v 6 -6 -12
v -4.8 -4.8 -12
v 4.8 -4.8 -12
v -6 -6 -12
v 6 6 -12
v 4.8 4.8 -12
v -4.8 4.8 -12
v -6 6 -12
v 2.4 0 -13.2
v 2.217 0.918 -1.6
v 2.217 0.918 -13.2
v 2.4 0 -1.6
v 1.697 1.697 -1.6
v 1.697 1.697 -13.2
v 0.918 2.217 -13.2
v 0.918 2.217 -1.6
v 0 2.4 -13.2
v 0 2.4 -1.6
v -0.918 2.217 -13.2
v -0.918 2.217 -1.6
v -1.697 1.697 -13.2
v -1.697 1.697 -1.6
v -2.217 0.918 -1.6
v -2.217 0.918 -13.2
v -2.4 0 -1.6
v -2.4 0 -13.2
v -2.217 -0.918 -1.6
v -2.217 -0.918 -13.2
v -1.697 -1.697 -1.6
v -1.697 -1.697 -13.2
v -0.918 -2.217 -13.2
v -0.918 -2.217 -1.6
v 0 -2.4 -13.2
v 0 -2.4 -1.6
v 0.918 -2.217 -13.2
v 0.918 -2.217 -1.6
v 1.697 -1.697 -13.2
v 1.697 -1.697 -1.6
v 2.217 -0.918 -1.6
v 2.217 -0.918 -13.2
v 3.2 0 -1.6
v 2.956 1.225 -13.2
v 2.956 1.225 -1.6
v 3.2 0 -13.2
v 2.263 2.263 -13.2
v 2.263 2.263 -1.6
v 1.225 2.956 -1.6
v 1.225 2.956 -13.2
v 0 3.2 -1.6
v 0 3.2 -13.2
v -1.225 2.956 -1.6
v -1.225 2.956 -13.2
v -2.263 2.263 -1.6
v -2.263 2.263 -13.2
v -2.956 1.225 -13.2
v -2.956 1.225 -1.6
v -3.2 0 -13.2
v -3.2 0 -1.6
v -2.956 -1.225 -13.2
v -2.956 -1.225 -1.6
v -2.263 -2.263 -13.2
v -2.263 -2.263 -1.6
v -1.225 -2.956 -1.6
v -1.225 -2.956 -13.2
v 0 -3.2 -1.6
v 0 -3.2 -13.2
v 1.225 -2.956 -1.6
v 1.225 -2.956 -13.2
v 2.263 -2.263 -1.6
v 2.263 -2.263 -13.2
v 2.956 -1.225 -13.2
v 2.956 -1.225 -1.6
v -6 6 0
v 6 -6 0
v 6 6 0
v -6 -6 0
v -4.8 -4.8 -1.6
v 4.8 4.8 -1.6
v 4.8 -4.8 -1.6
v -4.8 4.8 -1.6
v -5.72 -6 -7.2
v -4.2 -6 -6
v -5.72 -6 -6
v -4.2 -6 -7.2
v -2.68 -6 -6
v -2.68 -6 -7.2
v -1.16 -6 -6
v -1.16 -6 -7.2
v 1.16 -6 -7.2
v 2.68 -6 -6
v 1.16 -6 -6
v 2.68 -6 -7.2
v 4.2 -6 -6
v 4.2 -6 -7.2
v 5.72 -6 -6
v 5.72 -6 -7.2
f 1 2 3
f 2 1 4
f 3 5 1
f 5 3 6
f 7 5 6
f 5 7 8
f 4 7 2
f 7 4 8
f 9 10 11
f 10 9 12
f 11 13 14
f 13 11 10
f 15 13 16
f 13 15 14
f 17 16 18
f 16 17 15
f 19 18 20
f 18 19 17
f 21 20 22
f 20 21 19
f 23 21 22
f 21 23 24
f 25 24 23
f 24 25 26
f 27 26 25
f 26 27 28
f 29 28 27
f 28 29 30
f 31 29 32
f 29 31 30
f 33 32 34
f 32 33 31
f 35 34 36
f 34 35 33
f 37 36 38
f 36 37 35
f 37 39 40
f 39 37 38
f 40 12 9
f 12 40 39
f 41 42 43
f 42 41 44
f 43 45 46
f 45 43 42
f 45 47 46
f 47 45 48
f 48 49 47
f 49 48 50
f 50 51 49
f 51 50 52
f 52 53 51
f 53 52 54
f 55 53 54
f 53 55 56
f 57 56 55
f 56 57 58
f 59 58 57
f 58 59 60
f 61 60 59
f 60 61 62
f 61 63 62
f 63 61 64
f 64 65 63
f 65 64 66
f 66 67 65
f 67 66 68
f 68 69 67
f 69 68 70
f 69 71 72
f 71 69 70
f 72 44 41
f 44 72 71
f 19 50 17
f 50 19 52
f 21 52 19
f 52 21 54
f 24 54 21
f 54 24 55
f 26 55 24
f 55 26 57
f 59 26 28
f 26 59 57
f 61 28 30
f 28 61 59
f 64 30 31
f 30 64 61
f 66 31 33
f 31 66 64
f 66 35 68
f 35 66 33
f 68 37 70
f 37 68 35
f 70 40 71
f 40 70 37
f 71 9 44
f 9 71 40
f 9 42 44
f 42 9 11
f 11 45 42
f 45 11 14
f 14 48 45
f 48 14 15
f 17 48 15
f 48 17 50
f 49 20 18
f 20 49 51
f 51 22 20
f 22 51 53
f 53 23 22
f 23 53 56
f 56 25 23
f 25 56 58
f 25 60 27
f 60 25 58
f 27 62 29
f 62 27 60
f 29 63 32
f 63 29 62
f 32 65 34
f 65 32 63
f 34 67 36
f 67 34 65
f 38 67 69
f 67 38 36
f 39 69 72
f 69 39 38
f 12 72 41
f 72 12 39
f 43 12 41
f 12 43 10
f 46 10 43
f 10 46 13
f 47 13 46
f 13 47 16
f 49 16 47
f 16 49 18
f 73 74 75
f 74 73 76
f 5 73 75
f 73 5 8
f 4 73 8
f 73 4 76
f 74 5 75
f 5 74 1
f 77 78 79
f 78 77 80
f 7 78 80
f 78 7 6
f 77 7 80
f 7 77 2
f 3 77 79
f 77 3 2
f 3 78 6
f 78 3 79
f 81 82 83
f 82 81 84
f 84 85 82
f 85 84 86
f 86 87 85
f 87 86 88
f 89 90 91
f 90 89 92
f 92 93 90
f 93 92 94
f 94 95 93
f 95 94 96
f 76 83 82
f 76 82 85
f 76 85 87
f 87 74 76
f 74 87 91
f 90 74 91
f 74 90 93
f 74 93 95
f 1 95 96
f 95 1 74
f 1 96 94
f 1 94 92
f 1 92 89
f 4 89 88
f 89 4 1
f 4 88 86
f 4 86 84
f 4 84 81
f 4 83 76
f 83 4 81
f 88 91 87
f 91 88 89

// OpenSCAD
// file: ../p/4-4ring3.scad
use <../lib.scad>
$fa=1; $fs=0.2;
function ldraw_lib__4_4ring3(realsolid=false) = [
// 0 Ring  3 x 1.0
// 0 Name: 4-4ring3.dat
// 0 Author: James Jessiman
// 0 !LDRAW_ORG Primitive UPDATE 2009-01
// 0 !LICENSE Licensed under CC BY 2.0 and CC BY 4.0 : see CAreadme.txt
// 
// 0 BFC CERTIFY CCW
  [0,"BFC","CERTIFY"],
  [0,"BFC","CCW"],
// 
// 0 !HISTORY 1998-12-15 [PTadmin] Official Update 1998-10
// 0 !HISTORY 2002-04-05 [hafhead] Added BFC statement
// 0 !HISTORY 2002-04-25 [PTadmin] Official Update 2002-02
// 0 !HISTORY 2007-06-24 [PTadmin] Header formatted for Contributor Agreement
// 0 !HISTORY 2008-07-01 [PTadmin] Official Update 2008-01
// 0 !HISTORY 2008-08-26 [cwdee] Switch polygon winding and rename
// 0 !HISTORY 2009-05-02 [PTadmin] Official Update 2009-01
// 
// 
// 4 16 -1.5308 0 3.6956 -1.1481 0 2.7717 0 0 3 0 0 4
  [4,16,-1.5308,0,3.6956,-1.1481,0,2.7717,0,0,3,0,0,4],
// 4 16 -2.8284 0 2.8284 -2.1213 0 2.1213 -1.1481 0 2.7717 -1.5308 0 3.6956
  [4,16,-2.8284,0,2.8284,-2.1213,0,2.1213,-1.1481,0,2.7717,-1.5308,0,3.6956],
// 4 16 -3.6956 0 1.5308 -2.7717 0 1.1481 -2.1213 0 2.1213 -2.8284 0 2.8284
  [4,16,-3.6956,0,1.5308,-2.7717,0,1.1481,-2.1213,0,2.1213,-2.8284,0,2.8284],
// 4 16 -4 0 0 -3 0 0 -2.7717 0 1.1481 -3.6956 0 1.5308
  [4,16,-4,0,0,-3,0,0,-2.7717,0,1.1481,-3.6956,0,1.5308],
// 4 16 -3.6956 0 -1.5308 -2.7717 0 -1.1481 -3 0 0 -4 0 0
  [4,16,-3.6956,0,-1.5308,-2.7717,0,-1.1481,-3,0,0,-4,0,0],
// 4 16 -2.8284 0 -2.8284 -2.1213 0 -2.1213 -2.7717 0 -1.1481 -3.6956 0 -1.5308
  [4,16,-2.8284,0,-2.8284,-2.1213,0,-2.1213,-2.7717,0,-1.1481,-3.6956,0,-1.5308],
// 4 16 -1.5308 0 -3.6956 -1.1481 0 -2.7717 -2.1213 0 -2.1213 -2.8284 0 -2.8284
  [4,16,-1.5308,0,-3.6956,-1.1481,0,-2.7717,-2.1213,0,-2.1213,-2.8284,0,-2.8284],
// 4 16 0 0 -4 0 0 -3 -1.1481 0 -2.7717 -1.5308 0 -3.6956
  [4,16,0,0,-4,0,0,-3,-1.1481,0,-2.7717,-1.5308,0,-3.6956],
// 4 16 1.5308 0 -3.6956 1.1481 0 -2.7717 0 0 -3 0 0 -4
  [4,16,1.5308,0,-3.6956,1.1481,0,-2.7717,0,0,-3,0,0,-4],
// 4 16 2.8284 0 -2.8284 2.1213 0 -2.1213 1.1481 0 -2.7717 1.5308 0 -3.6956
  [4,16,2.8284,0,-2.8284,2.1213,0,-2.1213,1.1481,0,-2.7717,1.5308,0,-3.6956],
// 4 16 3.6956 0 -1.5308 2.7717 0 -1.1481 2.1213 0 -2.1213 2.8284 0 -2.8284
  [4,16,3.6956,0,-1.5308,2.7717,0,-1.1481,2.1213,0,-2.1213,2.8284,0,-2.8284],
// 4 16 4 0 0 3 0 0 2.7717 0 -1.1481 3.6956 0 -1.5308
  [4,16,4,0,0,3,0,0,2.7717,0,-1.1481,3.6956,0,-1.5308],
// 4 16 3.6956 0 1.5308 2.7717 0 1.1481 3 0 0 4 0 0
  [4,16,3.6956,0,1.5308,2.7717,0,1.1481,3,0,0,4,0,0],
// 4 16 2.8284 0 2.8284 2.1213 0 2.1213 2.7717 0 1.1481 3.6956 0 1.5308
  [4,16,2.8284,0,2.8284,2.1213,0,2.1213,2.7717,0,1.1481,3.6956,0,1.5308],
// 4 16 1.5308 0 3.6956 1.1481 0 2.7717 2.1213 0 2.1213 2.8284 0 2.8284
  [4,16,1.5308,0,3.6956,1.1481,0,2.7717,2.1213,0,2.1213,2.8284,0,2.8284],
// 4 16 0 0 4 0 0 3 1.1481 0 2.7717 1.5308 0 3.6956
  [4,16,0,0,4,0,0,3,1.1481,0,2.7717,1.5308,0,3.6956],
// 0
];
module ldraw_lib__4_4ring3(step=0, col=false, unit=2/5, alt=false, line=0.2, solid=!$preview)
    makepoly(ldraw_lib__4_4ring3(solid), step=step, col=col, unit=unit, alt=alt, line=line, solid=solid);
ldraw_lib__4_4ring3(line=0.2);
// file: ../p/4-4edge.scad
use <../lib.scad>
function ldraw_lib__4_4edge() = [
// 0 Circle 1.0
// 0 Name: 4-4edge.dat
// 0 Author: James Jessiman
// 0 !LDRAW_ORG Primitive UPDATE 2017-01
// 0 !LICENSE Licensed under CC BY 2.0 and CC BY 4.0 : see CAreadme.txt
// 
// 0 BFC CERTIFY CCW
  [0,"BFC","CERTIFY"],
  [0,"BFC","CCW"],
// 
// 0 !HISTORY 1998-12-15 [PTadmin] Official Update 1998-10
// 0 !HISTORY 2005-12-28 [PTadmin] Official Update 2005-01
// 0 !HISTORY 2007-06-24 [PTadmin] Header formatted for Contributor Agreement
// 0 !HISTORY 2008-07-01 [PTadmin] Official Update 2008-01
// 0 !HISTORY 2017-01-15 [Steffen] BFCed
// 0 !HISTORY 2017-12-30 [PTadmin] Official Update 2017-01
// 
// 
// 2 24 1 0 0 0.9239 0 0.3827
  [2,24,1,0,0,0.9239,0,0.3827],
// 2 24 0.9239 0 0.3827 0.7071 0 0.7071
  [2,24,0.9239,0,0.3827,0.7071,0,0.7071],
// 2 24 0.7071 0 0.7071 0.3827 0 0.9239
  [2,24,0.7071,0,0.7071,0.3827,0,0.9239],
// 2 24 0.3827 0 0.9239 0 0 1
  [2,24,0.3827,0,0.9239,0,0,1],
// 2 24 0 0 1 -0.3827 0 0.9239
  [2,24,0,0,1,-0.3827,0,0.9239],
// 2 24 -0.3827 0 0.9239 -0.7071 0 0.7071
  [2,24,-0.3827,0,0.9239,-0.7071,0,0.7071],
// 2 24 -0.7071 0 0.7071 -0.9239 0 0.3827
  [2,24,-0.7071,0,0.7071,-0.9239,0,0.3827],
// 2 24 -0.9239 0 0.3827 -1 0 -0
  [2,24,-0.9239,0,0.3827,-1,0,-0],
// 2 24 -1 0 -0 -0.9239 0 -0.3827
  [2,24,-1,0,-0,-0.9239,0,-0.3827],
// 2 24 -0.9239 0 -0.3827 -0.7071 0 -0.7071
  [2,24,-0.9239,0,-0.3827,-0.7071,0,-0.7071],
// 2 24 -0.7071 0 -0.7071 -0.3827 0 -0.9239
  [2,24,-0.7071,0,-0.7071,-0.3827,0,-0.9239],
// 2 24 -0.3827 0 -0.9239 0 0 -1
  [2,24,-0.3827,0,-0.9239,0,0,-1],
// 2 24 0 0 -1 0.3827 0 -0.9239
  [2,24,0,0,-1,0.3827,0,-0.9239],
// 2 24 0.3827 0 -0.9239 0.7071 0 -0.7071
  [2,24,0.3827,0,-0.9239,0.7071,0,-0.7071],
// 2 24 0.7071 0 -0.7071 0.9239 0 -0.3827
  [2,24,0.7071,0,-0.7071,0.9239,0,-0.3827],
// 2 24 0.9239 0 -0.3827 1 0 0
  [2,24,0.9239,0,-0.3827,1,0,0],
];
module ldraw_lib__4_4edge(step=0, col=false, unit=2/5, alt=false, line=0.2, solid=!$preview)
    makepoly(ldraw_lib__4_4edge(), step=step, col=col, unit=unit, alt=alt, line=line, solid=solid);
ldraw_lib__4_4edge(line=0.2);
// file: ../p/4-4cyli.scad
use <../lib.scad>
$fa=1; $fs=0.2;
function ldraw_lib__4_4cyli(realsolid=false) = [
// 0 Cylinder 1.0
// 0 Name: 4-4cyli.dat
// 0 Author: James Jessiman
// 0 !LDRAW_ORG Primitive UPDATE 2005-01
// 0 !LICENSE Licensed under CC BY 2.0 and CC BY 4.0 : see CAreadme.txt
// 
// 0 BFC CERTIFY CCW
  [0,"BFC","CERTIFY"],
  [0,"BFC","CCW"],
// 
// 0 !HISTORY 1998-12-15 [PTadmin] Official Update 1998-10
// 0 !HISTORY 2002-03-23 [sbliss] Added BFC statement; merged headers from files in distributions LDraw 0.27 and Complete.
// 0 !HISTORY 2002-04-25 [PTadmin] Official Update 2002-02
// 0 !HISTORY 2004-12-14 [guyvivan] BFC CCW
// 0 !HISTORY 2005-12-28 [PTadmin] Official Update 2005-01
// 0 !HISTORY 2007-06-24 [PTadmin] Header formatted for Contributor Agreement
// 0 !HISTORY 2008-07-01 [PTadmin] Official Update 2008-01
// 
// 
// 4 16 1 1 0 0.9239 1 0.3827 0.9239 0 0.3827 1 0 0
  [4,16,1,1,0,0.9239,1,0.3827,0.9239,0,0.3827,1,0,0],
// 5 24 1 0 0 1 1 0 0.9239 0 0.3827 0.9239 0 -0.3827
  [5,24,1,0,0,1,1,0,0.9239,0,0.3827,0.9239,0,-0.3827],
// 4 16 0.9239 1 0.3827 0.7071 1 0.7071 0.7071 0 0.7071 0.9239 0 0.3827
  [4,16,0.9239,1,0.3827,0.7071,1,0.7071,0.7071,0,0.7071,0.9239,0,0.3827],
// 5 24 0.9239 0 0.3827 0.9239 1 0.3827 0.7071 0 0.7071 1 0 0
  [5,24,0.9239,0,0.3827,0.9239,1,0.3827,0.7071,0,0.7071,1,0,0],
// 4 16 0.7071 1 0.7071 0.3827 1 0.9239 0.3827 0 0.9239 0.7071 0 0.7071
  [4,16,0.7071,1,0.7071,0.3827,1,0.9239,0.3827,0,0.9239,0.7071,0,0.7071],
// 5 24 0.7071 0 0.7071 0.7071 1 0.7071 0.3827 0 0.9239 0.9239 0 0.3827
  [5,24,0.7071,0,0.7071,0.7071,1,0.7071,0.3827,0,0.9239,0.9239,0,0.3827],
// 4 16 0.3827 1 0.9239 0 1 1 0 0 1 0.3827 0 0.9239
  [4,16,0.3827,1,0.9239,0,1,1,0,0,1,0.3827,0,0.9239],
// 5 24 0.3827 0 0.9239 0.3827 1 0.9239 0 0 1 0.7071 0 0.7071
  [5,24,0.3827,0,0.9239,0.3827,1,0.9239,0,0,1,0.7071,0,0.7071],
// 4 16 0 1 1 -0.3827 1 0.9239 -0.3827 0 0.9239 0 0 1
  [4,16,0,1,1,-0.3827,1,0.9239,-0.3827,0,0.9239,0,0,1],
// 5 24 0 0 1 0 1 1 -0.3827 0 0.9239 0.3827 0 0.9239
  [5,24,0,0,1,0,1,1,-0.3827,0,0.9239,0.3827,0,0.9239],
// 4 16 -0.3827 1 0.9239 -0.7071 1 0.7071 -0.7071 0 0.7071 -0.3827 0 0.9239
  [4,16,-0.3827,1,0.9239,-0.7071,1,0.7071,-0.7071,0,0.7071,-0.3827,0,0.9239],
// 5 24 -0.3827 0 0.9239 -0.3827 1 0.9239 -0.7071 0 0.7071 0 0 1
  [5,24,-0.3827,0,0.9239,-0.3827,1,0.9239,-0.7071,0,0.7071,0,0,1],
// 4 16 -0.7071 1 0.7071 -0.9239 1 0.3827 -0.9239 0 0.3827 -0.7071 0 0.7071
  [4,16,-0.7071,1,0.7071,-0.9239,1,0.3827,-0.9239,0,0.3827,-0.7071,0,0.7071],
// 5 24 -0.7071 0 0.7071 -0.7071 1 0.7071 -0.9239 0 0.3827 -0.3827 0 0.9239
  [5,24,-0.7071,0,0.7071,-0.7071,1,0.7071,-0.9239,0,0.3827,-0.3827,0,0.9239],
// 4 16 -0.9239 1 0.3827 -1 1 0 -1 0 0 -0.9239 0 0.3827
  [4,16,-0.9239,1,0.3827,-1,1,0,-1,0,0,-0.9239,0,0.3827],
// 5 24 -0.9239 0 0.3827 -0.9239 1 0.3827 -1 0 0 -0.7071 0 0.7071
  [5,24,-0.9239,0,0.3827,-0.9239,1,0.3827,-1,0,0,-0.7071,0,0.7071],
// 4 16 -1 1 0 -0.9239 1 -0.3827 -0.9239 0 -0.3827 -1 0 0
  [4,16,-1,1,0,-0.9239,1,-0.3827,-0.9239,0,-0.3827,-1,0,0],
// 5 24 -1 0 0 -1 1 0 -0.9239 0 -0.3827 -0.9239 0 0.3827
  [5,24,-1,0,0,-1,1,0,-0.9239,0,-0.3827,-0.9239,0,0.3827],
// 4 16 -0.9239 1 -0.3827 -0.7071 1 -0.7071 -0.7071 0 -0.7071 -0.9239 0 -0.3827
  [4,16,-0.9239,1,-0.3827,-0.7071,1,-0.7071,-0.7071,0,-0.7071,-0.9239,0,-0.3827],
// 5 24 -0.9239 0 -0.3827 -0.9239 1 -0.3827 -0.7071 0 -0.7071 -1 0 0
  [5,24,-0.9239,0,-0.3827,-0.9239,1,-0.3827,-0.7071,0,-0.7071,-1,0,0],
// 4 16 -0.7071 1 -0.7071 -0.3827 1 -0.9239 -0.3827 0 -0.9239 -0.7071 0 -0.7071
  [4,16,-0.7071,1,-0.7071,-0.3827,1,-0.9239,-0.3827,0,-0.9239,-0.7071,0,-0.7071],
// 5 24 -0.7071 0 -0.7071 -0.7071 1 -0.7071 -0.3827 0 -0.9239 -0.9239 0 -0.3827
  [5,24,-0.7071,0,-0.7071,-0.7071,1,-0.7071,-0.3827,0,-0.9239,-0.9239,0,-0.3827],
// 4 16 -0.3827 1 -0.9239 0 1 -1 0 0 -1 -0.3827 0 -0.9239
  [4,16,-0.3827,1,-0.9239,0,1,-1,0,0,-1,-0.3827,0,-0.9239],
// 5 24 -0.3827 0 -0.9239 -0.3827 1 -0.9239 0 0 -1 -0.7071 0 -0.7071
  [5,24,-0.3827,0,-0.9239,-0.3827,1,-0.9239,0,0,-1,-0.7071,0,-0.7071],
// 4 16 0 1 -1 0.3827 1 -0.9239 0.3827 0 -0.9239 0 0 -1
  [4,16,0,1,-1,0.3827,1,-0.9239,0.3827,0,-0.9239,0,0,-1],
// 5 24 0 0 -1 0 1 -1 0.3827 0 -0.9239 -0.3827 0 -0.9239
  [5,24,0,0,-1,0,1,-1,0.3827,0,-0.9239,-0.3827,0,-0.9239],
// 4 16 0.3827 1 -0.9239 0.7071 1 -0.7071 0.7071 0 -0.7071 0.3827 0 -0.9239
  [4,16,0.3827,1,-0.9239,0.7071,1,-0.7071,0.7071,0,-0.7071,0.3827,0,-0.9239],
// 5 24 0.3827 0 -0.9239 0.3827 1 -0.9239 0.7071 0 -0.7071 0 0 -1
  [5,24,0.3827,0,-0.9239,0.3827,1,-0.9239,0.7071,0,-0.7071,0,0,-1],
// 4 16 0.7071 1 -0.7071 0.9239 1 -0.3827 0.9239 0 -0.3827 0.7071 0 -0.7071
  [4,16,0.7071,1,-0.7071,0.9239,1,-0.3827,0.9239,0,-0.3827,0.7071,0,-0.7071],
// 5 24 0.7071 0 -0.7071 0.7071 1 -0.7071 0.9239 0 -0.3827 0.3827 0 -0.9239
  [5,24,0.7071,0,-0.7071,0.7071,1,-0.7071,0.9239,0,-0.3827,0.3827,0,-0.9239],
// 4 16 0.9239 1 -0.3827 1 1 0 1 0 0 0.9239 0 -0.3827
  [4,16,0.9239,1,-0.3827,1,1,0,1,0,0,0.9239,0,-0.3827],
// 5 24 0.9239 0 -0.3827 0.9239 1 -0.3827 1 0 0 0.7071 0 -0.7071
  [5,24,0.9239,0,-0.3827,0.9239,1,-0.3827,1,0,0,0.7071,0,-0.7071],
// 0
];
module ldraw_lib__4_4cyli(step=0, col=false, unit=2/5, alt=false, line=0.2, solid=!$preview)
    makepoly(ldraw_lib__4_4cyli(solid), step=step, col=col, unit=unit, alt=alt, line=line, solid=solid);
ldraw_lib__4_4cyli(line=0.2);
// file: ../p/stud4.scad
use <../lib.scad>
use <4-4cyli.scad>
use <4-4edge.scad>
use <4-4ring3.scad>
function ldraw_lib__stud4() = [
// 0 Stud Tube Open
// 0 Name: stud4.dat
// 0 Author: James Jessiman
// 0 !LDRAW_ORG Primitive UPDATE 2009-02
// 0 !LICENSE Licensed under CC BY 4.0 : see CAreadme.txt
// 
// 0 BFC CERTIFY CCW
  [0,"BFC","CERTIFY"],
  [0,"BFC","CCW"],
// 
// 0 !HISTORY 1999-07-05 [PTadmin] Official Update 1999-05
// 0 !HISTORY 2002-04-04 [sbliss] Modified for BFC compliance
// 0 !HISTORY 2002-04-25 [PTadmin] Official Update 2002-02
// 0 !HISTORY 2007-06-24 [PTadmin] Header formatted for Contributor Agreement
// 0 !HISTORY 2008-07-01 [PTadmin] Official Update 2008-01
// 0 !HISTORY 2009-06-21 [cwdee] Update ring references to 4-4ring
// 0 !HISTORY 2009-09-03 [PTadmin] Official Update 2009-02
// 
// 
// 1 16 0 -4 0 6 0 0 0 1 0 0 0 6 4-4edge.dat
  [1,16,0,-4,0,6,0,0,0,1,0,0,0,6, ldraw_lib__4_4edge()],
// 1 16 0 -4 0 8 0 0 0 1 0 0 0 8 4-4edge.dat
  [1,16,0,-4,0,8,0,0,0,1,0,0,0,8, ldraw_lib__4_4edge()],
// 1 16 0 0 0 6 0 0 0 1 0 0 0 6 4-4edge.dat
  [1,16,0,0,0,6,0,0,0,1,0,0,0,6, ldraw_lib__4_4edge()],
// 1 16 0 0 0 8 0 0 0 1 0 0 0 8 4-4edge.dat
  [1,16,0,0,0,8,0,0,0,1,0,0,0,8, ldraw_lib__4_4edge()],
// 0 BFC INVERTNEXT
  [0,"BFC","INVERTNEXT"],
// 1 16 0 -4 0 6 0 0 0 4 0 0 0 6 4-4cyli.dat
  [1,16,0,-4,0,6,0,0,0,4,0,0,0,6, ldraw_lib__4_4cyli()],
// 1 16 0 -4 0 8 0 0 0 4 0 0 0 8 4-4cyli.dat
  [1,16,0,-4,0,8,0,0,0,4,0,0,0,8, ldraw_lib__4_4cyli()],
// 1 16 0 -4 0 2 0 0 0 1 0 0 0 2 4-4ring3.dat
  [1,16,0,-4,0,2,0,0,0,1,0,0,0,2, ldraw_lib__4_4ring3()],
  [-1,16,0,0,0,2,0,0,0,-1,0,0,0,2, ldraw_lib__4_4ring3()],
// 0
];
module ldraw_lib__stud4(step=0, col=false, unit=2/5, alt=false, line=0.2, solid=!$preview)
    makepoly(ldraw_lib__stud4(), step=step, col=col, unit=unit, alt=alt, line=line, solid=solid);
ldraw_lib__stud4(line=0.2);
// file: ../p/box5.scad
use <../lib.scad>
function ldraw_lib__box5() = [
// 0 Box with 5 Faces and All Edges
// 0 Name: box5.dat
// 0 Author: James Jessiman
// 0 !LDRAW_ORG Primitive UPDATE 2012-01
// 0 !LICENSE Licensed under CC BY 2.0 and CC BY 4.0 : see CAreadme.txt
// 
// 0 BFC CERTIFY CCW
  [0,"BFC","CERTIFY"],
  [0,"BFC","CCW"],
// 
// 0 !HISTORY 2002-04-03 [sbliss] Modified for BFC compliance
// 0 !HISTORY 2002-04-25 [PTadmin] Official Update 2002-02
// 0 !HISTORY 2007-06-24 [PTadmin] Header formatted for Contributor Agreement
// 0 !HISTORY 2008-07-01 [PTadmin] Official Update 2008-01
// 0 !HISTORY 2012-02-16 [Philo] Changed to CCW
// 0 !HISTORY 2012-03-30 [PTadmin] Official Update 2012-01
// 
// 
// 2 24 1 1 1 -1 1 1
  [2,24,1,1,1,-1,1,1],
// 2 24 -1 1 1 -1 1 -1
  [2,24,-1,1,1,-1,1,-1],
// 2 24 -1 1 -1 1 1 -1
  [2,24,-1,1,-1,1,1,-1],
// 2 24 1 1 -1 1 1 1
  [2,24,1,1,-1,1,1,1],
// 2 24 1 0 1 -1 0 1
  [2,24,1,0,1,-1,0,1],
// 2 24 -1 0 1 -1 0 -1
  [2,24,-1,0,1,-1,0,-1],
// 2 24 -1 0 -1 1 0 -1
  [2,24,-1,0,-1,1,0,-1],
// 2 24 1 0 -1 1 0 1
  [2,24,1,0,-1,1,0,1],
// 2 24 1 0 1 1 1 1
  [2,24,1,0,1,1,1,1],
// 2 24 -1 0 1 -1 1 1
  [2,24,-1,0,1,-1,1,1],
// 2 24 1 0 -1 1 1 -1
  [2,24,1,0,-1,1,1,-1],
// 2 24 -1 0 -1 -1 1 -1
  [2,24,-1,0,-1,-1,1,-1],
// 4 16 -1 1 1 1 1 1 1 1 -1 -1 1 -1
  [4,16,-1,1,1,1,1,1,1,1,-1,-1,1,-1],
// 4 16 -1 1 1 -1 0 1 1 0 1 1 1 1
  [4,16,-1,1,1,-1,0,1,1,0,1,1,1,1],
// 4 16 -1 1 -1 -1 0 -1 -1 0 1 -1 1 1
  [4,16,-1,1,-1,-1,0,-1,-1,0,1,-1,1,1],
// 4 16 1 1 -1 1 0 -1 -1 0 -1 -1 1 -1
  [4,16,1,1,-1,1,0,-1,-1,0,-1,-1,1,-1],
// 4 16 1 1 1 1 0 1 1 0 -1 1 1 -1
  [4,16,1,1,1,1,0,1,1,0,-1,1,1,-1],
];
makepoly(ldraw_lib__box5(), line=0.2);
// file: ../p/box4t.scad
use <../lib.scad>
function ldraw_lib__box4t() = [
// 0 Box with 4 Adjacent Faces and All Edges
// 0 Name: box4t.dat
// 0 Author: Tore Eriksson [Tore_Eriksson]
// 0 !LDRAW_ORG Primitive UPDATE 2003-02
// 0 !LICENSE Licensed under CC BY 2.0 and CC BY 4.0 : see CAreadme.txt
// 
// 0 BFC CERTIFY CCW
  [0,"BFC","CERTIFY"],
  [0,"BFC","CCW"],
// 
// 0 !HISTORY 1997-09-29 [PTadmin] Official Update 1997-15
// 0 !HISTORY 2002-08-31 [izanette] Modified with WINDZ for BFC compliance
// 0 !HISTORY 2003-08-01 [PTadmin] Official Update 2003-02
// 0 !HISTORY 2007-06-24 [PTadmin] Header formatted for Contributor Agreement
// 0 !HISTORY 2008-07-01 [PTadmin] Official Update 2008-01
// 
// 
// 2 24 1 1 1 -1 1 1
  [2,24,1,1,1,-1,1,1],
// 2 24 -1 1 1 -1 1 -1
  [2,24,-1,1,1,-1,1,-1],
// 2 24 -1 1 -1 1 1 -1
  [2,24,-1,1,-1,1,1,-1],
// 2 24 1 1 -1 1 1 1
  [2,24,1,1,-1,1,1,1],
// 2 24 1 0 1 -1 0 1
  [2,24,1,0,1,-1,0,1],
// 2 24 -1 0 1 -1 0 -1
  [2,24,-1,0,1,-1,0,-1],
// 2 24 -1 0 -1 1 0 -1
  [2,24,-1,0,-1,1,0,-1],
// 2 24 1 0 -1 1 0 1
  [2,24,1,0,-1,1,0,1],
// 2 24 1 0 1 1 1 1
  [2,24,1,0,1,1,1,1],
// 2 24 -1 0 1 -1 1 1
  [2,24,-1,0,1,-1,1,1],
// 2 24 1 0 -1 1 1 -1
  [2,24,1,0,-1,1,1,-1],
// 2 24 -1 0 -1 -1 1 -1
  [2,24,-1,0,-1,-1,1,-1],
// 4 16 1 1 1 1 1 -1 -1 1 -1 -1 1 1
  [4,16,1,1,1,1,1,-1,-1,1,-1,-1,1,1],
// 4 16 1 1 1 -1 1 1 -1 0 1 1 0 1
  [4,16,1,1,1,-1,1,1,-1,0,1,1,0,1],
// 4 16 -1 1 1 -1 1 -1 -1 0 -1 -1 0 1
  [4,16,-1,1,1,-1,1,-1,-1,0,-1,-1,0,1],
// 0 4 16 -1 1 -1 -1 0 -1 1 0 -1 1 1 -1
// 4 16 1 1 -1 1 1 1 1 0 1 1 0 -1
  [4,16,1,1,-1,1,1,1,1,0,1,1,0,-1],
// 0
];
makepoly(ldraw_lib__box4t(), line=0.2);
// file: s/19729s01.scad
use <../../lib.scad>
use <../../p/box4t.scad>
use <../../p/box5.scad>
use <../../p/stud4.scad>
function ldraw_lib__s__19729s01() = [
// 0 ~Minifig Head Cuboid without Front Surface
// 0 Name: s\19729s01.dat
// 0 Author: Mark Kennedy [mkennedy]
// 0 !LDRAW_ORG Subpart UPDATE 2016-01
// 0 !LICENSE Licensed under CC BY 4.0 : see CAreadme.txt
// 
// 0 BFC CERTIFY CW
  [0,"BFC","CERTIFY"],
  [0,"BFC","CW"],
// 
// 0 !HISTORY 2016-03-18 {LEGO Digital Designer} Original part shape
// 0 !HISTORY 2016-03-28 [mkennedy] Primitive substitution
// 0 !HISTORY 2016-12-31 [PTadmin] Official Update 2016-01
// 
// 
// 4 16 15 30 -15 12 30 -12 -12 30 -12 -15 30 -15
  [4,16,15,30,-15,12,30,-12,-12,30,-12,-15,30,-15],
// 4 16 15 30 15 12 30 12 12 30 -12 15 30 -15
  [4,16,15,30,15,12,30,12,12,30,-12,15,30,-15],
// 4 16 -15 30 15 -12 30 12 12 30 12 15 30 15
  [4,16,-15,30,15,-12,30,12,12,30,12,15,30,15],
// 4 16 -15 30 -15 -12 30 -12 -12 30 12 -15 30 15
  [4,16,-15,30,-15,-12,30,-12,-12,30,12,-15,30,15],
// 0
// 1 16 0 4 0 1 0 0 0 -7.25 0 0 0 1 stud4.dat
  [1,16,0,4,0,1,0,0,0,-7.25,0,0,0,1, ldraw_lib__stud4()],
// 1 16 0 30 0 15 0 0 0 -30 0 0 0 15 box4t.dat
  [1,16,0,30,0,15,0,0,0,-30,0,0,0,15, ldraw_lib__box4t()],
// 0 BFC INVERTNEXT
  [0,"BFC","INVERTNEXT"],
// 1 16 0 30 0 12 0 0 0 -26 0 0 0 12 box5.dat
  [1,16,0,30,0,12,0,0,0,-26,0,0,0,12, ldraw_lib__box5()],
// 
];
module ldraw_lib__s__19729s01(step=0, col=false, unit=2/5, alt=false, line=0.2, solid=!$preview)
    makepoly(ldraw_lib__s__19729s01(), step=step, col=col, unit=unit, alt=alt, line=line, solid=solid);
ldraw_lib__s__19729s01(line=0.2);
// main file
use <../lib.scad>
use <s/19729s01.scad>
function ldraw_lib__19729p08() = [
// 0 Minifig Head Cuboid with Minecraft Enderman Face Pattern
// 0 Name: 19729p08.dat
// 0 Author: Vincent Messenet [Cheenzo]
// 0 !LDRAW_ORG Part UPDATE 2024-08
// 0 !LICENSE Licensed under CC BY 4.0 : see CAreadme.txt
// 
// 0 BFC CERTIFY CCW
  [0,"BFC","CERTIFY"],
  [0,"BFC","CCW"],
// 
// 0 !KEYWORDS Bricklink 19729pb006, Rebrickable 19729pr0004, Set 21117, Set 21124
// 0 !KEYWORDS Set 21128, Set 21134, Set 21137, Set 21151
// 
// 0 !HISTORY 2024-09-30 [OrionP] Official Update 2024-08
// 
// 1 16 0 0 0 1 0 0 0 1 0 0 0 1 s\19729s01.dat
  [1,16,0,0,0,1,0,0,0,1,0,0,0,1, ldraw_lib__s__19729s01()],
// 
// 4 29 -14.3 15 -15 -14.3 18 -15 -10.5 18 -15 -10.5 15 -15
  [4,29,-14.3,15,-15,-14.3,18,-15,-10.5,18,-15,-10.5,15,-15],
// 4 5 -6.7 15 -15 -10.5 15 -15 -10.5 18 -15 -6.7 18 -15
  [4,5,-6.7,15,-15,-10.5,15,-15,-10.5,18,-15,-6.7,18,-15],
// 4 29 -2.9 15 -15 -6.7 15 -15 -6.7 18 -15 -2.9 18 -15
  [4,29,-2.9,15,-15,-6.7,15,-15,-6.7,18,-15,-2.9,18,-15],
// 4 29 2.9 18 -15 6.7 18 -15 6.7 15 -15 2.9 15 -15
  [4,29,2.9,18,-15,6.7,18,-15,6.7,15,-15,2.9,15,-15],
// 4 5 6.7 15 -15 6.7 18 -15 10.5 18 -15 10.5 15 -15
  [4,5,6.7,15,-15,6.7,18,-15,10.5,18,-15,10.5,15,-15],
// 4 29 10.5 15 -15 10.5 18 -15 14.3 18 -15 14.3 15 -15
  [4,29,10.5,15,-15,10.5,18,-15,14.3,18,-15,14.3,15,-15],
// 3 16 -15 0 -15 -14.3 15 -15 -10.5 15 -15
  [3,16,-15,0,-15,-14.3,15,-15,-10.5,15,-15],
// 3 16 -15 0 -15 -10.5 15 -15 -6.7 15 -15
  [3,16,-15,0,-15,-10.5,15,-15,-6.7,15,-15],
// 3 16 -15 0 -15 -6.7 15 -15 -2.9 15 -15
  [3,16,-15,0,-15,-6.7,15,-15,-2.9,15,-15],
// 4 16 -15 0 -15 -2.9 15 -15 2.9 15 -15 15 0 -15
  [4,16,-15,0,-15,-2.9,15,-15,2.9,15,-15,15,0,-15],
// 3 16 6.7 15 -15 15 0 -15 2.9 15 -15
  [3,16,6.7,15,-15,15,0,-15,2.9,15,-15],
// 3 16 15 0 -15 6.7 15 -15 10.5 15 -15
  [3,16,15,0,-15,6.7,15,-15,10.5,15,-15],
// 3 16 15 0 -15 10.5 15 -15 14.3 15 -15
  [3,16,15,0,-15,10.5,15,-15,14.3,15,-15],
// 4 16 15 0 -15 14.3 15 -15 14.3 18 -15 15 30 -15
  [4,16,15,0,-15,14.3,15,-15,14.3,18,-15,15,30,-15],
// 3 16 15 30 -15 14.3 18 -15 10.5 18 -15
  [3,16,15,30,-15,14.3,18,-15,10.5,18,-15],
// 3 16 15 30 -15 10.5 18 -15 6.7 18 -15
  [3,16,15,30,-15,10.5,18,-15,6.7,18,-15],
// 3 16 15 30 -15 6.7 18 -15 2.9 18 -15
  [3,16,15,30,-15,6.7,18,-15,2.9,18,-15],
// 4 16 15 30 -15 2.9 18 -15 -2.9 18 -15 -15 30 -15
  [4,16,15,30,-15,2.9,18,-15,-2.9,18,-15,-15,30,-15],
// 3 16 -15 30 -15 -2.9 18 -15 -6.7 18 -15
  [3,16,-15,30,-15,-2.9,18,-15,-6.7,18,-15],
// 3 16 -15 30 -15 -6.7 18 -15 -10.5 18 -15
  [3,16,-15,30,-15,-6.7,18,-15,-10.5,18,-15],
// 3 16 -15 30 -15 -10.5 18 -15 -14.3 18 -15
  [3,16,-15,30,-15,-10.5,18,-15,-14.3,18,-15],
// 4 16 -15 30 -15 -14.3 18 -15 -14.3 15 -15 -15 0 -15
  [4,16,-15,30,-15,-14.3,18,-15,-14.3,15,-15,-15,0,-15],
// 4 16 -2.9 15 -15 -2.9 18 -15 2.9 18 -15 2.9 15 -15
  [4,16,-2.9,15,-15,-2.9,18,-15,2.9,18,-15,2.9,15,-15],
];
module ldraw_lib__19729p08(step=0, col=false, unit=2/5, alt=false, line=0.2, solid=!$preview)
    makepoly(ldraw_lib__19729p08(), step=step, col=col, unit=unit, alt=alt, line=line, solid=solid);
ldraw_lib__19729p08(line=0.2);
